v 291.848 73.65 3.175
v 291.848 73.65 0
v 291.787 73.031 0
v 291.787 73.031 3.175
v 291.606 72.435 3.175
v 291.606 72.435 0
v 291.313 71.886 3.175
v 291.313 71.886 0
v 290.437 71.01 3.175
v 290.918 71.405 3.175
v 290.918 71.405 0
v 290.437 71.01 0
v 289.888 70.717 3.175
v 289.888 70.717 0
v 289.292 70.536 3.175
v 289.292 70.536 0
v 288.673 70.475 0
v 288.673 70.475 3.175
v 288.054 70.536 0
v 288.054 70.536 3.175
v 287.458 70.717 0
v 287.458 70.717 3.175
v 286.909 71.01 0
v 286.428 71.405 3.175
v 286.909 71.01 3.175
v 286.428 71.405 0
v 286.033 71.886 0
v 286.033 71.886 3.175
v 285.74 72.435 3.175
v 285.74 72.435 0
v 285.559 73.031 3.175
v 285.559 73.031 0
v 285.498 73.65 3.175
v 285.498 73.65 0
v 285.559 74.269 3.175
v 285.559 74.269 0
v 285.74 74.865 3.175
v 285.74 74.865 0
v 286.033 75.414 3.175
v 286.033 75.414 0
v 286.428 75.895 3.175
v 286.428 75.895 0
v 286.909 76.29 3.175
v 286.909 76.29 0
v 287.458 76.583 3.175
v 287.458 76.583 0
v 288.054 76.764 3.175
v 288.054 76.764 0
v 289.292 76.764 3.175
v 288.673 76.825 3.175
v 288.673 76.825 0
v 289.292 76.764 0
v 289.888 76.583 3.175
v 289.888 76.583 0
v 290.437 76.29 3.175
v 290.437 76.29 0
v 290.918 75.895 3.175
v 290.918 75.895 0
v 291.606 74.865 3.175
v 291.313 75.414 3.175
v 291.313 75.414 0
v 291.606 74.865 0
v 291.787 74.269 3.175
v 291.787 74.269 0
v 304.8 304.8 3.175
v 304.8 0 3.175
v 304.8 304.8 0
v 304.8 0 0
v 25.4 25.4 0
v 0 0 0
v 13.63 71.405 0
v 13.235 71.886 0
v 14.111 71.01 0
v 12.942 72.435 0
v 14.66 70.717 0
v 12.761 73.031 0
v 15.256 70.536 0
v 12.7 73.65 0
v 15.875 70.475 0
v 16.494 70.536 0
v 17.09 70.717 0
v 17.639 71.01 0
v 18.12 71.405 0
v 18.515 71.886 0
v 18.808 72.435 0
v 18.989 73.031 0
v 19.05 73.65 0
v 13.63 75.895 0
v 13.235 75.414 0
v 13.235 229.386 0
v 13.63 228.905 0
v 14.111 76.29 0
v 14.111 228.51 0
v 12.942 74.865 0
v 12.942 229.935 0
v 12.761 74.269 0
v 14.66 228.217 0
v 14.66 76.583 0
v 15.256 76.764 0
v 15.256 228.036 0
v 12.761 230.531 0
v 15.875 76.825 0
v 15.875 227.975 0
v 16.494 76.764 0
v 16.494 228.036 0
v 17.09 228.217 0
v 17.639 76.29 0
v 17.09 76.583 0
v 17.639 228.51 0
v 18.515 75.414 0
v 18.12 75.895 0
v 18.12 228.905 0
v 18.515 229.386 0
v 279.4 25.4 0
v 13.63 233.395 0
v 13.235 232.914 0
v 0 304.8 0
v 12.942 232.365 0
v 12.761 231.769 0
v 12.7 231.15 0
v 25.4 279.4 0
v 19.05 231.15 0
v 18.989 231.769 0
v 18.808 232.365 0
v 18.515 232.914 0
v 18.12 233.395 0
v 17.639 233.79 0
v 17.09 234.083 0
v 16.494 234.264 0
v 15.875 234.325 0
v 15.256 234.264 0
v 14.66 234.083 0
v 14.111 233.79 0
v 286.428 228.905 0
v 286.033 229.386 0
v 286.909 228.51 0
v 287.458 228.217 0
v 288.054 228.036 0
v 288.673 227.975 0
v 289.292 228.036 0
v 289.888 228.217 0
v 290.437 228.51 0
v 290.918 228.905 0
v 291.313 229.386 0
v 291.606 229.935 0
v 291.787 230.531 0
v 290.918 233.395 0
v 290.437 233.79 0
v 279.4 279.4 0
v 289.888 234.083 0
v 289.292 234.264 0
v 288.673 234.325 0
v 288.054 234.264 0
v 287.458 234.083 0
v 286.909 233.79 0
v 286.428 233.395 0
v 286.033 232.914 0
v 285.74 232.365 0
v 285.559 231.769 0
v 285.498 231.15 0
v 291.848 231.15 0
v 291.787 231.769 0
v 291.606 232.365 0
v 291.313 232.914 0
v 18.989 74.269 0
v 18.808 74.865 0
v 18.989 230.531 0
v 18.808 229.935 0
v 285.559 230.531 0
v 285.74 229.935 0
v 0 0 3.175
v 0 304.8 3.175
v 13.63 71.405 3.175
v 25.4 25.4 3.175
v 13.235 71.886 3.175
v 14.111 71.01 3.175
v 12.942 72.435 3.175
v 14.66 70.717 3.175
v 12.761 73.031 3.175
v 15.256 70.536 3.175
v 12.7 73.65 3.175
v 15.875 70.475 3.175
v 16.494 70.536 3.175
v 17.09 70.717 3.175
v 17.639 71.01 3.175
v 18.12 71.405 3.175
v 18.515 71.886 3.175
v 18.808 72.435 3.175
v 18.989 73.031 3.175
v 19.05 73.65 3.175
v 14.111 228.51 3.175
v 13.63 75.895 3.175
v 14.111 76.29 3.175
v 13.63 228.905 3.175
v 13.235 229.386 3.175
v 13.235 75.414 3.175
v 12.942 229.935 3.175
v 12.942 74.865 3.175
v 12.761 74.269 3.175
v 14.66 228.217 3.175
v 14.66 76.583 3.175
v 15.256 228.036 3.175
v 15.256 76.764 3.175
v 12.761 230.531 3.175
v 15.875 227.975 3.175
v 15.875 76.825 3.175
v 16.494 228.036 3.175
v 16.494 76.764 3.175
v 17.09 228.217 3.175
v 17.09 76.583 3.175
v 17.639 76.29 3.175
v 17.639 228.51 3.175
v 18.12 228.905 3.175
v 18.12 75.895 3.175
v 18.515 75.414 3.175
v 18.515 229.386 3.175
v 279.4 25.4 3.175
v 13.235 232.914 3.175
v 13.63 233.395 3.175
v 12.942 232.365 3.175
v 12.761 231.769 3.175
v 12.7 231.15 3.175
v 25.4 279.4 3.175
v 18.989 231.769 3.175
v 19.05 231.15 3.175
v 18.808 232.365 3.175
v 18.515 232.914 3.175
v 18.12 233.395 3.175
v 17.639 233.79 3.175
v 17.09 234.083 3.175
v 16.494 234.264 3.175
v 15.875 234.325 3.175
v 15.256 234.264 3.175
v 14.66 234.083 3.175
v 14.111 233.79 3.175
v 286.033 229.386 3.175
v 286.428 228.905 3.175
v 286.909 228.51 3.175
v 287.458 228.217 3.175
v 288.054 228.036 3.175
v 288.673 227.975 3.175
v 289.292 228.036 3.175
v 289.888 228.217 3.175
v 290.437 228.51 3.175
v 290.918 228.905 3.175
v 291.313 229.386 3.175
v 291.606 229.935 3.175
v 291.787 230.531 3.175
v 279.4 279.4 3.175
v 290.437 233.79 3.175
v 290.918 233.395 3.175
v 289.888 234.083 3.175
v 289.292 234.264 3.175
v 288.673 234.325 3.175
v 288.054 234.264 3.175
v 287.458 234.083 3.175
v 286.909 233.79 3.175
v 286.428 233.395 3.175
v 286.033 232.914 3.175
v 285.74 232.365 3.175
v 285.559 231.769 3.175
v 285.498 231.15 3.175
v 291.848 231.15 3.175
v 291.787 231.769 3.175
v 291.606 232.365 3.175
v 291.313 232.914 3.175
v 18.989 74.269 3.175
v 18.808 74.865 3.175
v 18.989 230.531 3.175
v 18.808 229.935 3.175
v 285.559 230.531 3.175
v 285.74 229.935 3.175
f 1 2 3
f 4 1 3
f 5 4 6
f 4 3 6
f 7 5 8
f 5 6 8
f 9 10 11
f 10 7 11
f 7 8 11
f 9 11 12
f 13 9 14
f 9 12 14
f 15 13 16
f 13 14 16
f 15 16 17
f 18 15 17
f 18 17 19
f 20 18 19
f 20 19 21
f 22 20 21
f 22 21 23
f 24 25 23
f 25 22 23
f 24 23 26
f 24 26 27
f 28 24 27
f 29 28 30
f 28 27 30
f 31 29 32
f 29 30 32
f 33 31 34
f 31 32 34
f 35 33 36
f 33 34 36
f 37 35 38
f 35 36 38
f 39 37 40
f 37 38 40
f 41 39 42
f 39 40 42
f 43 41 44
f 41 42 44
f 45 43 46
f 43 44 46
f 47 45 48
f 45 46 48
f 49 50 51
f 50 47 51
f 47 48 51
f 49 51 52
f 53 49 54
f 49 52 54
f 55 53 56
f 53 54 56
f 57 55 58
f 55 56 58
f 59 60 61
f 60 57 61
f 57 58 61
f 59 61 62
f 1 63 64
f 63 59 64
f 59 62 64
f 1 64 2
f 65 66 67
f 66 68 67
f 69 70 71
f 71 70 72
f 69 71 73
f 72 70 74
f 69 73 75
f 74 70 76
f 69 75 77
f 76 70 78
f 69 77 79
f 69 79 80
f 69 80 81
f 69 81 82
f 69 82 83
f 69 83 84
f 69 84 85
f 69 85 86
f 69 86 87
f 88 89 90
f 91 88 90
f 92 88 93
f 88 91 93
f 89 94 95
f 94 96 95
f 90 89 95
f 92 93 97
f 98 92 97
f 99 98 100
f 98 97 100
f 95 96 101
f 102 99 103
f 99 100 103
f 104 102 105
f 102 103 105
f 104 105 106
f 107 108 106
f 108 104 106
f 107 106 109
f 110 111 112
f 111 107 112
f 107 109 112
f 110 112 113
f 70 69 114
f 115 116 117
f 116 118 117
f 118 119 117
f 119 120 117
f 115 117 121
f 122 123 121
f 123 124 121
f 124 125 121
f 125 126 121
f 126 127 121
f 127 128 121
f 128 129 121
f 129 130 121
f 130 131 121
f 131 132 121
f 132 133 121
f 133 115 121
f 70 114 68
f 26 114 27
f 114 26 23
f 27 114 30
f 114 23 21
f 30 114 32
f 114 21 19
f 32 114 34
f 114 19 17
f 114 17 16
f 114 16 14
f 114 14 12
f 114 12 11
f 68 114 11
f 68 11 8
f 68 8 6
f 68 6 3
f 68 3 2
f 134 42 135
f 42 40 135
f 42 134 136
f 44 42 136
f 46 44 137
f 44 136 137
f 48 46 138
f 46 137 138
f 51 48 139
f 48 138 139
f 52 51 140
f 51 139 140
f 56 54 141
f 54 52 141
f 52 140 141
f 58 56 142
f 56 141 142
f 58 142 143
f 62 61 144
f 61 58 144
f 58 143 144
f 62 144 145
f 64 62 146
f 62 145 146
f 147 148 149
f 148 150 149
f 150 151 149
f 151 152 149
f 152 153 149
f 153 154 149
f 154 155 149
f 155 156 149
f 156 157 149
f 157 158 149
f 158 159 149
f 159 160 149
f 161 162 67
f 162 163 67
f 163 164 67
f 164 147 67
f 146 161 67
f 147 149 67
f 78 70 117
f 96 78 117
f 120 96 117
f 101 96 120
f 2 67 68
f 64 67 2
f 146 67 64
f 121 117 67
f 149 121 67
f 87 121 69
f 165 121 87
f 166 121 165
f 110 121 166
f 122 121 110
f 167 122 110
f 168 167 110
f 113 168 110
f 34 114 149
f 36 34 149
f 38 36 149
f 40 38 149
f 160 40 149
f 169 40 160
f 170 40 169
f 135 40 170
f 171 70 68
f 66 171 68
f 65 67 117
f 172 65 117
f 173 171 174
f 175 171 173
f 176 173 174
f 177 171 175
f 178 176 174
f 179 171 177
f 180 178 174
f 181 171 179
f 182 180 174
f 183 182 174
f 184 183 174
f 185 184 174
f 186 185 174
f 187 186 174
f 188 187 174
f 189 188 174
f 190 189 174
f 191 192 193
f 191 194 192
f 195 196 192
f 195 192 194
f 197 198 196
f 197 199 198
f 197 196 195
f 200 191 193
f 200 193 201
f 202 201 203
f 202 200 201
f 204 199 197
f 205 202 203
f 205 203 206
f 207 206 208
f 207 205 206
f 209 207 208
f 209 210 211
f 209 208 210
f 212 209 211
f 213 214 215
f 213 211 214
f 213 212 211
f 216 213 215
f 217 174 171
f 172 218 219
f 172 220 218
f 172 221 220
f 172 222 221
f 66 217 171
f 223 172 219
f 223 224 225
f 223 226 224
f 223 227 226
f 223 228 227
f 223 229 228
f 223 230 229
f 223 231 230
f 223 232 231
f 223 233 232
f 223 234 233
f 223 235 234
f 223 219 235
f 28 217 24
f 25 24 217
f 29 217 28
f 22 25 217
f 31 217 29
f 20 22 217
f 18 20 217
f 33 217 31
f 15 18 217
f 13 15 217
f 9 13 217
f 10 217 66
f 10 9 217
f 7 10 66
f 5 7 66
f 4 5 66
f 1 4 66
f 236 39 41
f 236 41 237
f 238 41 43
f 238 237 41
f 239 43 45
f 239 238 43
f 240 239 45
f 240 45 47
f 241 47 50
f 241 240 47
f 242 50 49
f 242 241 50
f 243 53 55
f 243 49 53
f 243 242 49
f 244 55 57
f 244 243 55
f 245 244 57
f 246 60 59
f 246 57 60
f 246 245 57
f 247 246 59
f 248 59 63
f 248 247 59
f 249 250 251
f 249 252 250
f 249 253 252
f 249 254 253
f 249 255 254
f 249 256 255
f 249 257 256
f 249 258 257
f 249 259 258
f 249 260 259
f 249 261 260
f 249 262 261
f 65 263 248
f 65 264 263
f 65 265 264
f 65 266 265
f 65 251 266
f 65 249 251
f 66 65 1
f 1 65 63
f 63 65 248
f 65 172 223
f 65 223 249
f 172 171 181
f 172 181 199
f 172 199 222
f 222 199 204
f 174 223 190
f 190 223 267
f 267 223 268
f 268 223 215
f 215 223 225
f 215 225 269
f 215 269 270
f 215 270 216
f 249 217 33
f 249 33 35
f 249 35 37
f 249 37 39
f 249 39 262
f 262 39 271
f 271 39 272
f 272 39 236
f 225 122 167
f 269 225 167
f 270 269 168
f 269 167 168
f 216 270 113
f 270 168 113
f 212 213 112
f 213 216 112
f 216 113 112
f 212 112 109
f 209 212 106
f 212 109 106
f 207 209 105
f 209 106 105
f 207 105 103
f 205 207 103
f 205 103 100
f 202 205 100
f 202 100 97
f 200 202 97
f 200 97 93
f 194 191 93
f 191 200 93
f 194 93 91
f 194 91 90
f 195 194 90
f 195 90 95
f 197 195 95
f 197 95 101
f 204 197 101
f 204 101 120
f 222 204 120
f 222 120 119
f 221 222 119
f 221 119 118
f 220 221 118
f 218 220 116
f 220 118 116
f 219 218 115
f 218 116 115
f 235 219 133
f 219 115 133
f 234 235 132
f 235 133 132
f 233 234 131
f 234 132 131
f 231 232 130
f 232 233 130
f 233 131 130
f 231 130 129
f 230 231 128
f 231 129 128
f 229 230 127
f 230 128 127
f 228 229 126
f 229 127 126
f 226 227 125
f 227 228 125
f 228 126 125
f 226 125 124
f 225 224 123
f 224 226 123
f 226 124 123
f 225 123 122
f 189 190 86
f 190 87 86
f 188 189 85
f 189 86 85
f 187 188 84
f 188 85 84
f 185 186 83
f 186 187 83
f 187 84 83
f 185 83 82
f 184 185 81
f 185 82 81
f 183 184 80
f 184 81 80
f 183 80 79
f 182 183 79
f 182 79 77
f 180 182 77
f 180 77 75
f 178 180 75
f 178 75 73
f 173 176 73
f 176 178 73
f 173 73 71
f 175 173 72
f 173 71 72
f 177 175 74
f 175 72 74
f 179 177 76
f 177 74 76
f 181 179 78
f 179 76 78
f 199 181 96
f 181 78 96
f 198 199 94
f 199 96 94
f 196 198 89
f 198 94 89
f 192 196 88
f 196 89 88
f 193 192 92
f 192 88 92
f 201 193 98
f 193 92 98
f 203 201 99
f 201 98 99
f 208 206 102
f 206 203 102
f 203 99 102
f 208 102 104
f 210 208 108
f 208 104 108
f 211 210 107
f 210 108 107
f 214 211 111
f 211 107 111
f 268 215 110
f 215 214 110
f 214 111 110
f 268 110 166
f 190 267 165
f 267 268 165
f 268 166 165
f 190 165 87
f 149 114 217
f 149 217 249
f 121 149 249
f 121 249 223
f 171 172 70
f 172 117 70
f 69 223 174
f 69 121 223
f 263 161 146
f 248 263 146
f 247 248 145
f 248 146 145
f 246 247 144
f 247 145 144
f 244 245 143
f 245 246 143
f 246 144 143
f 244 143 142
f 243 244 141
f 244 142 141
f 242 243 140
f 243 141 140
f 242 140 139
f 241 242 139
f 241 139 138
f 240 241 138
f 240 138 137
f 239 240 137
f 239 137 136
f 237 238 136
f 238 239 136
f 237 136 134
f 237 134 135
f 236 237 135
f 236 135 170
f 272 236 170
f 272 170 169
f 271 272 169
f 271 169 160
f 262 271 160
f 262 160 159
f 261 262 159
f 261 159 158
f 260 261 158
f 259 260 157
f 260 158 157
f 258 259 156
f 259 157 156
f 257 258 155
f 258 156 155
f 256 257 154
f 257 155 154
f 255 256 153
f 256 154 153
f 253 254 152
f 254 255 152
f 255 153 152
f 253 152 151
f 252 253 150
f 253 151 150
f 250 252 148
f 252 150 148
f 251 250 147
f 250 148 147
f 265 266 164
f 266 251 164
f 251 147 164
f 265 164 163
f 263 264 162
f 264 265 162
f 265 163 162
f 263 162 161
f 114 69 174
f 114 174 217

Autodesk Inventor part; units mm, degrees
ref_plane "YZ Plane" through (0, 0, 0) normal (1, 0, 0) x (0, 1, 0)
ref_plane "XZ Plane" through (0, 0, 0) normal (0, 1, 0) x (-1, 0, 0)
ref_plane "XY Plane" through (0, 0, 0) normal (0, 0, 1) x (1, 0, 0)
sketch "Sketch1" plane through (0, 0, 0) normal (0, 0, 1) x (1, 0, 0)
  line L0 (0, 0) -> (304.8, 0)
  line L1 (304.8, 0) -> (304.8, 304.8)
  line L2 (304.8, 304.8) -> (0, 304.8)
  line L3 (0, 304.8) -> (0, 0)
  line L4 (25.4, 25.4) -> (279.4, 25.4)
  line L5 (279.4, 25.4) -> (279.4, 279.4)
  line L6 (279.4, 279.4) -> (25.4, 279.4)
  line L7 (25.4, 279.4) -> (25.4, 25.4)
  circle A0 centre (15.875, 231.15) radius 3.175
  circle A1 centre (288.673, 231.15) radius 3.175
  circle A2 centre (15.875, 73.65) radius 3.175
  circle A3 centre (288.673, 73.65) radius 3.175
  dimension "d0" = 304.8
  dimension "d1" = 304.8
  dimension "d2" = 254
  dimension "d3" = 254
  dimension "d4" = 25.4
  dimension "d5" = 25.4
  dimension "d8" = 6.35
  dimension "d9" = 73.65
  dimension "d10" = 15.875
  dimension "d13" = 272.798
  dimension "d16" = 157.5
extrude "Extrusion1" add sketch "Sketch1" along normal blind 3.175
properties part number "TurretBasePlate"
